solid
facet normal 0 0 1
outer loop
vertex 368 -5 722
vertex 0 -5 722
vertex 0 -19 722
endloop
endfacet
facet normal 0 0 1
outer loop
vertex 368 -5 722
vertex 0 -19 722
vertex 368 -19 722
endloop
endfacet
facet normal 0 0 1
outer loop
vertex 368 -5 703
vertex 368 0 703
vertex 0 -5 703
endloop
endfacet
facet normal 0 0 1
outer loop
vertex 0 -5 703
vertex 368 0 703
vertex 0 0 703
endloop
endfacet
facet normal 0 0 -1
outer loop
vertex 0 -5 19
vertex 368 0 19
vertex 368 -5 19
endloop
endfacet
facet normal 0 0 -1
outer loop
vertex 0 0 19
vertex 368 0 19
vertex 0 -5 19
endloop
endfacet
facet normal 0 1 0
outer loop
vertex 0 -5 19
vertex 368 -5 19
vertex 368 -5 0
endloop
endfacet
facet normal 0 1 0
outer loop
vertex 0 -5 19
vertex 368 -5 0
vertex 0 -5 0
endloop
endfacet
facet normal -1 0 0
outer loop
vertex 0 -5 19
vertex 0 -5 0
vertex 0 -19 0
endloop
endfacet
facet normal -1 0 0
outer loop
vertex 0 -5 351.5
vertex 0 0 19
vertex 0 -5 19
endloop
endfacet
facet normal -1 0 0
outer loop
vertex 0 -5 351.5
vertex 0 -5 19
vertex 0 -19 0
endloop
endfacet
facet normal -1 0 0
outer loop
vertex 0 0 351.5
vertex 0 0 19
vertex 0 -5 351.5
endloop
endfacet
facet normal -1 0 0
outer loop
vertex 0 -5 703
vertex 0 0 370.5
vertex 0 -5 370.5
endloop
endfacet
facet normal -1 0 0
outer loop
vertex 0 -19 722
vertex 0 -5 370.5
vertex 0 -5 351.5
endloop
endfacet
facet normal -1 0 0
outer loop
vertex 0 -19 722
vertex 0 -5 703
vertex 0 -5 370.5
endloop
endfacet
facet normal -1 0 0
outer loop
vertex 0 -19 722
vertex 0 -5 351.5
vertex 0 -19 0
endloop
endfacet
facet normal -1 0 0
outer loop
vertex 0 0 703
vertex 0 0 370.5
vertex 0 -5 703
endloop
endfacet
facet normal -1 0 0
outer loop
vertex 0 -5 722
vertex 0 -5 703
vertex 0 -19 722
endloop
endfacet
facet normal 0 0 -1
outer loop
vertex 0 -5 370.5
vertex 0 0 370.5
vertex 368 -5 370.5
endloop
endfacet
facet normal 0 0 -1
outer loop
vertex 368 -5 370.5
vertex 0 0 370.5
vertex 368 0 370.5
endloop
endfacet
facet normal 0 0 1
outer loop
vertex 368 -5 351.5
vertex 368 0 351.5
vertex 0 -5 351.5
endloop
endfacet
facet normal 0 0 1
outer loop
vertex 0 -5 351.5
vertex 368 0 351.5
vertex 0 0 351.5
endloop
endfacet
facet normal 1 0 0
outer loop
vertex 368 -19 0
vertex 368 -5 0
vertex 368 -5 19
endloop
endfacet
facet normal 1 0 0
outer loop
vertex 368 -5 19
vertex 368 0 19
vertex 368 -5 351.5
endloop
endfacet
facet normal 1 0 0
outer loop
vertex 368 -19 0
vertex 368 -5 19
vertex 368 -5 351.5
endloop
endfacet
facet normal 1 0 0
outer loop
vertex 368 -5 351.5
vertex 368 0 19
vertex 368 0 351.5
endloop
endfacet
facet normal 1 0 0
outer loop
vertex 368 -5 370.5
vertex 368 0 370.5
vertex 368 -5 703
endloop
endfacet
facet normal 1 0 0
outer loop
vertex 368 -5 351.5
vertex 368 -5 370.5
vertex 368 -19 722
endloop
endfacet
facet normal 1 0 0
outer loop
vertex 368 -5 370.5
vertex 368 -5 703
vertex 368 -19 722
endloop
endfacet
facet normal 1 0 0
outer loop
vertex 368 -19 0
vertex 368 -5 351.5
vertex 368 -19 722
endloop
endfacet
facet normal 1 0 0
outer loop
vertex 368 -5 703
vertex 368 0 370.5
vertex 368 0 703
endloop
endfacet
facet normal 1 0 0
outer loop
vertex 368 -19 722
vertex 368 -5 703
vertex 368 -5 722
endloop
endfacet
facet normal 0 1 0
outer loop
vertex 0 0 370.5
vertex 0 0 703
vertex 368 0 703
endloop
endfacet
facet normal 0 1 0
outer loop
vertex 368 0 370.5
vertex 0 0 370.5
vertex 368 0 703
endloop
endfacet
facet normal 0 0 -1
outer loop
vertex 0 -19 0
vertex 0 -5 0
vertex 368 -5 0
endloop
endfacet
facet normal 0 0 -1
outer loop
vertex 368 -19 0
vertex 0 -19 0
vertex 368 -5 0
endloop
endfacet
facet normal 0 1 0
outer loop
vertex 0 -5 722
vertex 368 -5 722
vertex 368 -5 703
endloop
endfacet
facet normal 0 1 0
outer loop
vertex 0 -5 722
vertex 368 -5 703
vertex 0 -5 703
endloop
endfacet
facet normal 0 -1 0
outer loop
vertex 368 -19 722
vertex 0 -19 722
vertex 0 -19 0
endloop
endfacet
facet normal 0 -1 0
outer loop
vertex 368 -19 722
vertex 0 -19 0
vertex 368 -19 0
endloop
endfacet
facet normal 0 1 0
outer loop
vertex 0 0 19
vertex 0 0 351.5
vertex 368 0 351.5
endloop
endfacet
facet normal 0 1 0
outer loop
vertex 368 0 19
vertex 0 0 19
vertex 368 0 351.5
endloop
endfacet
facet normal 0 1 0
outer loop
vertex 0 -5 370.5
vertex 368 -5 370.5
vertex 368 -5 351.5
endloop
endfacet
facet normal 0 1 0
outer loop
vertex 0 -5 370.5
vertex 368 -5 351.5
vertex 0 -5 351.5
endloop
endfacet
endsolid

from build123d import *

# Parameters (mm, degrees)
F0_W     = 368
F0_H     = 722
F1_DEPTH = 19
F2_W     = 368
F2_H     = 19
F3_DEPTH = 5


with BuildPart() as f1:
    # F0 (on Front) → F1 (new body)
    with BuildSketch(Plane.XZ):
        with Locations((184, 361)):
            Rectangle(F0_W, F0_H)
    extrude(amount=F1_DEPTH)

    # F2 (on face) → F3 (cut)
    with BuildSketch(Plane(origin=(0, 0, 0), x_dir=(-1, 0, 0), z_dir=(0, 1, 0))):
        Polygon((-368, 370.5), (-368, 361), (-368, 351.5), (0, 351.5), (0, 361), (0, 370.5), align=None)
        with Locations((-184, 9.5)):
            Rectangle(F2_W, F2_H)
        with Locations((-184, 712.5)):
            Rectangle(F2_W, F2_H)
    extrude(amount=-F3_DEPTH, mode=Mode.SUBTRACT)


solid = f1.part
